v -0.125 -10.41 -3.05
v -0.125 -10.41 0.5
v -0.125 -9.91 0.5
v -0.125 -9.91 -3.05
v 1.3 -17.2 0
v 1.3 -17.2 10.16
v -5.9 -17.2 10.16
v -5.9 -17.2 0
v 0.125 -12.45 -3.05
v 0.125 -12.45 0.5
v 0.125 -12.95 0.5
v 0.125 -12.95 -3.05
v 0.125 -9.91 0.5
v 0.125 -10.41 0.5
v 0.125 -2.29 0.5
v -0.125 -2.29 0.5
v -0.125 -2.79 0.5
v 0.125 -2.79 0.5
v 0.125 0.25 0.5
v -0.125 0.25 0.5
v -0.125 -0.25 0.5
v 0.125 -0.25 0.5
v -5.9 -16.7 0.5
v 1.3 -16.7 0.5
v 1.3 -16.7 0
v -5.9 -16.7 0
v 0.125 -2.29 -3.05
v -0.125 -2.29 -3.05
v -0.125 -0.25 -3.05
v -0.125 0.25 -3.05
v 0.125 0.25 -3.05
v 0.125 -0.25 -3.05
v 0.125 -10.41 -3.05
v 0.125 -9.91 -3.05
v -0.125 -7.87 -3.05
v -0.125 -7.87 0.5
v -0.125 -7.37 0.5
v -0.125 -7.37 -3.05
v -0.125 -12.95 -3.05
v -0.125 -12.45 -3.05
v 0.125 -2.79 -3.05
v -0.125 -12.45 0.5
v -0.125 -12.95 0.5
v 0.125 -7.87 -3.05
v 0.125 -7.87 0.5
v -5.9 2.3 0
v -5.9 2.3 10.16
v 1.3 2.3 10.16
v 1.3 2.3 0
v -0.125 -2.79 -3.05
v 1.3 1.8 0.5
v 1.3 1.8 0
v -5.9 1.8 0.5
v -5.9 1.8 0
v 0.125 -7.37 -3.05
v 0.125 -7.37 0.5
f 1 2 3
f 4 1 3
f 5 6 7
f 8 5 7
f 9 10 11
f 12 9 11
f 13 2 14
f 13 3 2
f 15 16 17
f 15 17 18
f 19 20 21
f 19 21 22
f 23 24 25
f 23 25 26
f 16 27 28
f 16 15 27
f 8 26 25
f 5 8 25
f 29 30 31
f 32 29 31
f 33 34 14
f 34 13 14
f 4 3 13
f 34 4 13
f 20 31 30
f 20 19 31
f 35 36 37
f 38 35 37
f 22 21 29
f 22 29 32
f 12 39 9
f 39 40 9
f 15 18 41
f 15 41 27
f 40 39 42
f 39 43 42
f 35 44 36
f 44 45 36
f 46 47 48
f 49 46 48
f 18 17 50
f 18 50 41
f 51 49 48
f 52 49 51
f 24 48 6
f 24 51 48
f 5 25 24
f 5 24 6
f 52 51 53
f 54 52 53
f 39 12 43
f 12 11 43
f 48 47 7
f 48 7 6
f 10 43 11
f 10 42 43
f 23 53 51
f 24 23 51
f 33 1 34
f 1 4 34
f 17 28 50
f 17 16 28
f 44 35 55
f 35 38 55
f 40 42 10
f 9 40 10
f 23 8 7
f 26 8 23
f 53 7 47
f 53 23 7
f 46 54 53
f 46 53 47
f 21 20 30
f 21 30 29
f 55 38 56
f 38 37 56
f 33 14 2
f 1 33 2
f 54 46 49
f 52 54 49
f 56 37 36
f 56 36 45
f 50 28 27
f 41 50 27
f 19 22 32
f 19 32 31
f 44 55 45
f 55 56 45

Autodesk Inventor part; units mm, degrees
ref_plane "YZ Plane" through (0, 0, 0) normal (1, 0, 0) x (0, 1, 0)
ref_plane "XZ Plane" through (0, 0, 0) normal (0, 1, 0) x (-1, 0, 0)
ref_plane "XY Plane" through (0, 0, 0) normal (0, 0, 1) x (1, 0, 0)
sketch "Sketch2" plane through (0, 0, 0) normal (0, 0, 1) x (1, 0, 0)
  line L0 (-5.9, 2.3) -> (1.3, 2.3)
  line L1 (1.3, 2.3) -> (1.3, -17.2)
  line L2 (1.3, -17.2) -> (-5.9, -17.2)
  line L3 (-5.9, -17.2) -> (-5.9, 2.3)
  line L4 (-0.125, -0.25) -> (0.125, -0.25)
  line L5 (0.125, -0.25) -> (0.125, 0.25)
  line L6 (0.125, 0.25) -> (-0.125, 0.25)
  line L7 (-0.125, 0.25) -> (-0.125, -0.25)
  line L8 (-0.125, -0.25) -> (0.125, 0.25) construction
  line L9 (0.125, -0.25) -> (-0.125, 0.25) construction
  line L10 (-0.125, -2.79) -> (0.125, -2.79)
  line L11 (0.125, -2.79) -> (0.125, -2.29)
  line L12 (0.125, -2.29) -> (-0.125, -2.29)
  line L13 (-0.125, -2.29) -> (-0.125, -2.79)
  line L14 (-0.125, -2.79) -> (0.125, -2.29) construction
  line L15 (0.125, -2.79) -> (-0.125, -2.29) construction
  line L16 (-0.125, -7.37) -> (0.125, -7.37)
  line L17 (0.125, -7.37) -> (0.125, -7.87)
  line L18 (0.125, -7.87) -> (-0.125, -7.87)
  line L19 (-0.125, -7.87) -> (-0.125, -7.37)
  line L20 (-0.125, -7.37) -> (0.125, -7.87) construction
  line L21 (0.125, -7.37) -> (-0.125, -7.87) construction
  line L22 (-0.125, -9.91) -> (0.125, -9.91)
  line L23 (0.125, -9.91) -> (0.125, -10.41)
  line L24 (-0.125, -10.41) -> (-0.125, -9.91)
  line L25 (-0.125, -9.91) -> (0.125, -10.41) construction
  line L26 (0.125, -9.91) -> (-0.125, -10.41) construction
  line L27 (0.125, -10.41) -> (-0.125, -10.41)
  line L28 (-0.125, -12.45) -> (0.125, -12.45)
  line L29 (0.125, -12.45) -> (0.125, -12.95)
  line L30 (-0.125, -12.95) -> (-0.125, -12.45)
  line L31 (-0.125, -12.45) -> (0.125, -12.95) construction
  line L32 (0.125, -12.45) -> (-0.125, -12.95) construction
  line L33 (0.125, -12.95) -> (-0.125, -12.95)
  line L34 (-5.9, 2.3) -> (1.3, 2.3)
  line L35 (1.3, 2.3) -> (1.3, 1.8)
  line L36 (1.3, 1.8) -> (-5.9, 1.8)
  line L37 (-5.9, 1.8) -> (-5.9, 2.3)
  line L38 (-5.9, -17.2) -> (1.3, -17.2)
  line L39 (1.3, -17.2) -> (1.3, -16.7)
  line L40 (1.3, -16.7) -> (-5.9, -16.7)
  line L41 (-5.9, -16.7) -> (-5.9, -17.2)
  point P0 (0, 0)
  point P1 (0, -2.54)
  point P2 (0, -7.62)
  point P3 (0, -10.16)
  point P4 (0, -12.7)
  dimension "d37" = 2.3
  dimension "d38" = 1.3
  dimension "d40" = 7.2
  dimension "d41" = 0.25
  dimension "d42" = 0.5
  dimension "d45" = 2.54
  dimension "d50" = 0.25
  dimension "d51" = 0.5
  dimension "d52" = 0
  dimension "d53" = 7.62
  dimension "d56" = 2.54
  dimension "d61" = 0.5
  dimension "d62" = 0.5
  dimension "d72" = 19.5
extrude "Extrusion4" add sketch "Sketch2" along normal blind 9.66 contours L0 L1 L36 L3 | L36 L1 L40 L3 | L40 L1 L2 L3 | L7 L6 L5 L4 | L13 L12 L11 L10 | L16 L17 L18 L19 | L22 L23 L27 L24 | L28 L29 L33 L30
extrude "Extrusion5" add sketch "Sketch2" against normal blind 0.5 contours L0 L1 L36 L3 | L40 L1 L2 L3
extrude "Extrusion6" add sketch "Sketch2" against normal blind 3.55 separate body contours L7 L6 L5 L4 | L13 L12 L11 L10 | L16 L17 L18 L19 | L22 L23 L27 L24 | L28 L29 L33 L30
move or copy body "Move Body1" bodies to move or copy 1 2 copy no translate (0, 0, 0.5)
equation "\"d50\" = d41"
equation "\"d51\" = d42"
properties part number "Converter_DCDC_XP_POWER-IHxxxx_SIP_THT"
